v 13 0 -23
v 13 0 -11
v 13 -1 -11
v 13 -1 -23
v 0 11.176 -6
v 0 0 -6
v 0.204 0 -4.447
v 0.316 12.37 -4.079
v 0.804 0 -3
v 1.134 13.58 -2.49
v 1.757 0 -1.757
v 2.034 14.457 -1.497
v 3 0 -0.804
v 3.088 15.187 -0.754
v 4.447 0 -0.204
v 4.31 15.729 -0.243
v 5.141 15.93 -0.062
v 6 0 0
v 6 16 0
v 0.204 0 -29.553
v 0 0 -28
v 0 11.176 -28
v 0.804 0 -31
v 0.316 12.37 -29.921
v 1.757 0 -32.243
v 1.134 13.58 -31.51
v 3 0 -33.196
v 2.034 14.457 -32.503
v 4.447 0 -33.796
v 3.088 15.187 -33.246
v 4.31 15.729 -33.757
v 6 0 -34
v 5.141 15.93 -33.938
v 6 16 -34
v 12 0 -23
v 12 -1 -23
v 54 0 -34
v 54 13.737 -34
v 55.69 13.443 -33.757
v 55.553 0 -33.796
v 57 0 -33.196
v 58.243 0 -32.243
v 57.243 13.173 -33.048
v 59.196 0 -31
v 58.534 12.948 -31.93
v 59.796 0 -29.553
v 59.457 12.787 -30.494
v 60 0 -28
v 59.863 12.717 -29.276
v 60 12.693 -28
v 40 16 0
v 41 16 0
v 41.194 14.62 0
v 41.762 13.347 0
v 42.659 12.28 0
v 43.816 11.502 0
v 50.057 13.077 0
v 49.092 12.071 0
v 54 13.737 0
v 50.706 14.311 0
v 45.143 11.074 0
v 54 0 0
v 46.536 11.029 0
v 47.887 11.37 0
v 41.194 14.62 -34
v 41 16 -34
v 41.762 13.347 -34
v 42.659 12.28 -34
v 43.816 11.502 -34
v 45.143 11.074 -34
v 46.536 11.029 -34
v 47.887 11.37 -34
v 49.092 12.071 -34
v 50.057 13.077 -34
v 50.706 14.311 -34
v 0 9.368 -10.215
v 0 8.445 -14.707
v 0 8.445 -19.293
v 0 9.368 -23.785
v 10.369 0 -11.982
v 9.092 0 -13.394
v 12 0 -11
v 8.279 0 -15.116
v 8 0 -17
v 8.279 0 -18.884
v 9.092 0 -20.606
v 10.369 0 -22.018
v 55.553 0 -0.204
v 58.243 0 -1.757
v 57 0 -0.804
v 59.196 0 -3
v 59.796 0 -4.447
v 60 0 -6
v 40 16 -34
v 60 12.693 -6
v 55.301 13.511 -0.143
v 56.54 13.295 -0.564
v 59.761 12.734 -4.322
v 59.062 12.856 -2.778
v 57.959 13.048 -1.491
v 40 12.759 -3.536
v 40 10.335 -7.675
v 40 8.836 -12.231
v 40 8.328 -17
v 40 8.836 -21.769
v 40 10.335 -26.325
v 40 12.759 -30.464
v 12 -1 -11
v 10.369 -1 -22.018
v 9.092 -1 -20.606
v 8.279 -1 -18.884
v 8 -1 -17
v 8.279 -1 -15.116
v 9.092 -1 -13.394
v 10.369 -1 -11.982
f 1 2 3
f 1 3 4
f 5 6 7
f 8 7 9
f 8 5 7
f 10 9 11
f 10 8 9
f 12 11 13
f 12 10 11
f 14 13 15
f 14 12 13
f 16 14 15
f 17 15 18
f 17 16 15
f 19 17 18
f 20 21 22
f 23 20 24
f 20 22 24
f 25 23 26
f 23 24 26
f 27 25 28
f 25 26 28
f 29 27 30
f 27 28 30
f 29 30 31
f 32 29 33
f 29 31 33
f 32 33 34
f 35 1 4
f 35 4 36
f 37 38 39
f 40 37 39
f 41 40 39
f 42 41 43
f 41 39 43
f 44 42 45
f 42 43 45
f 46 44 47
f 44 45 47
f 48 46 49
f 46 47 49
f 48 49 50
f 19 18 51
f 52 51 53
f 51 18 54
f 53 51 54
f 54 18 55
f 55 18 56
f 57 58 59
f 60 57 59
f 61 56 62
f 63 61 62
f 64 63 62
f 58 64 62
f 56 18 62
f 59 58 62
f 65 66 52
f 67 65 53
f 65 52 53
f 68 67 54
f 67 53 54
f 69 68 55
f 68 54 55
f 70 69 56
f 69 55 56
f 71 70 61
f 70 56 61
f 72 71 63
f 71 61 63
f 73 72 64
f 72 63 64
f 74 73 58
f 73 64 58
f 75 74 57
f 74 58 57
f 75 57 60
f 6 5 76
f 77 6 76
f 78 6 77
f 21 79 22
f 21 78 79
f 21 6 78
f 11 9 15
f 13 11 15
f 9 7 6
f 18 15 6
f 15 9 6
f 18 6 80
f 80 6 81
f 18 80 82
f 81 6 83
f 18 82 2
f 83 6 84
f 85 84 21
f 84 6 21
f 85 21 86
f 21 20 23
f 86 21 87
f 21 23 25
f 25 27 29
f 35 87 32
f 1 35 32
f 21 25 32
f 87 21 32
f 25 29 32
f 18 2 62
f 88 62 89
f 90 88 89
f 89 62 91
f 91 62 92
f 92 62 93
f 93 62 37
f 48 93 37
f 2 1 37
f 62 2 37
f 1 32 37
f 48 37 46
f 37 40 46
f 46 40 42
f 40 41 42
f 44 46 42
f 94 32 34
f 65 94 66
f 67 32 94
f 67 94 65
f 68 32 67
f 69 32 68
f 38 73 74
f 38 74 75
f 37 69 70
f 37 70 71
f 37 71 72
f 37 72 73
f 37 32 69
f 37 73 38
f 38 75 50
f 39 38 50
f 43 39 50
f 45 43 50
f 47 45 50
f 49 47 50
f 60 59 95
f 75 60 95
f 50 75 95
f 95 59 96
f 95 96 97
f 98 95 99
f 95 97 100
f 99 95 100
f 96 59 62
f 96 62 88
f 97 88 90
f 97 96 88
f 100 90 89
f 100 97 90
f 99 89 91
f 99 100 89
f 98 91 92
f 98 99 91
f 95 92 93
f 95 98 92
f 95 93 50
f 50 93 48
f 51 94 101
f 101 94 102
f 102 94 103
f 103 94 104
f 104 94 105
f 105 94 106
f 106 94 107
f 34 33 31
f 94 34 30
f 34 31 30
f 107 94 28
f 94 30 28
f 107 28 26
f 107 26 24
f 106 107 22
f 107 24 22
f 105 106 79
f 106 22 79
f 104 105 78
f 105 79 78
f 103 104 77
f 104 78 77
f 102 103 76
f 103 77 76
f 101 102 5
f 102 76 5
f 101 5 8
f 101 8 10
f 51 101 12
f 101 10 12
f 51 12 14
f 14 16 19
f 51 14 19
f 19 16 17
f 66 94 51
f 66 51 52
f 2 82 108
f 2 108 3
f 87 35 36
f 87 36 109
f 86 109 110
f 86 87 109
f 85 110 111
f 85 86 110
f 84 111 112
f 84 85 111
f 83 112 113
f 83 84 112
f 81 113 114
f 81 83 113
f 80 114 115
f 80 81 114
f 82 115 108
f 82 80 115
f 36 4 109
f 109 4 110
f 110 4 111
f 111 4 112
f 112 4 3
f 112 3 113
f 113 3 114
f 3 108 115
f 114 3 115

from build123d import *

# Parameters (mm, degrees)
SKETCH1_W           = 60
SKETCH1_H           = 34
BOSS_EXTRUDE1_DEPTH = 16
SKETCH6_R           = 22.671568098
CUT_EXTRUDE4_DEPTH  = 40
SKETCH2_R           = 5
CUT_EXTRUDE1_DEPTH  = 71.795480082
FILLET1_R           = 6
CUT_EXTRUDE3_DEPTH  = 71.795480152
BOSS_EXTRUDE2_DEPTH = 1


with BuildPart() as part:
    # Sketch1 → Boss-Extrude1 (new body)
    with BuildSketch(Plane(origin=(0, 0, 0), x_dir=(1, 0, 0), z_dir=(0, 1, 0))):
        with Locations((30, 17)):
            Rectangle(SKETCH1_W, SKETCH1_H)
    extrude(amount=BOSS_EXTRUDE1_DEPTH)

    # Sketch6 → Cut-Extrude4 (cut)
    with BuildSketch(Plane.ZY):
        with Locations((-17, 31)):
            Circle(SKETCH6_R)
    extrude(amount=-CUT_EXTRUDE4_DEPTH, mode=Mode.SUBTRACT)

    # Sketch2 → Cut-Extrude1 (cut, through all)
    with BuildSketch(Plane.XY):
        with Locations((46, 16)):
            Circle(SKETCH2_R)
    extrude(amount=-CUT_EXTRUDE1_DEPTH, mode=Mode.SUBTRACT)

    # Fillet1
    fillet1_edges = [part.edges().sort_by_distance(p)[0] for p in [
        (0, 8, -34),
        (60, 8, -34),
        (60, 8, 0),
        (0, 8, 0),
    ]]
    fillet(fillet1_edges, radius=FILLET1_R)

    # Sketch5 → Cut-Extrude3 (cut, through all)
    with BuildSketch(Plane.XY):
        Polygon((50.705913613, 14.310509822), (60, 12.692705636), (60, 16), (51, 16), align=None)
    extrude(amount=-CUT_EXTRUDE3_DEPTH, mode=Mode.SUBTRACT)

    # Sketch7 → Boss-Extrude2 (add)
    with BuildSketch(Plane.XZ):
        with BuildLine():
            Line((13, -11), (13, -23))
            Line((13, -23), (12, -23))
            ThreePointArc((12, -23), (8, -17), (12, -11))
            Line((12, -11), (13, -11))
        make_face()
    extrude(amount=BOSS_EXTRUDE2_DEPTH)


solid = part.part
